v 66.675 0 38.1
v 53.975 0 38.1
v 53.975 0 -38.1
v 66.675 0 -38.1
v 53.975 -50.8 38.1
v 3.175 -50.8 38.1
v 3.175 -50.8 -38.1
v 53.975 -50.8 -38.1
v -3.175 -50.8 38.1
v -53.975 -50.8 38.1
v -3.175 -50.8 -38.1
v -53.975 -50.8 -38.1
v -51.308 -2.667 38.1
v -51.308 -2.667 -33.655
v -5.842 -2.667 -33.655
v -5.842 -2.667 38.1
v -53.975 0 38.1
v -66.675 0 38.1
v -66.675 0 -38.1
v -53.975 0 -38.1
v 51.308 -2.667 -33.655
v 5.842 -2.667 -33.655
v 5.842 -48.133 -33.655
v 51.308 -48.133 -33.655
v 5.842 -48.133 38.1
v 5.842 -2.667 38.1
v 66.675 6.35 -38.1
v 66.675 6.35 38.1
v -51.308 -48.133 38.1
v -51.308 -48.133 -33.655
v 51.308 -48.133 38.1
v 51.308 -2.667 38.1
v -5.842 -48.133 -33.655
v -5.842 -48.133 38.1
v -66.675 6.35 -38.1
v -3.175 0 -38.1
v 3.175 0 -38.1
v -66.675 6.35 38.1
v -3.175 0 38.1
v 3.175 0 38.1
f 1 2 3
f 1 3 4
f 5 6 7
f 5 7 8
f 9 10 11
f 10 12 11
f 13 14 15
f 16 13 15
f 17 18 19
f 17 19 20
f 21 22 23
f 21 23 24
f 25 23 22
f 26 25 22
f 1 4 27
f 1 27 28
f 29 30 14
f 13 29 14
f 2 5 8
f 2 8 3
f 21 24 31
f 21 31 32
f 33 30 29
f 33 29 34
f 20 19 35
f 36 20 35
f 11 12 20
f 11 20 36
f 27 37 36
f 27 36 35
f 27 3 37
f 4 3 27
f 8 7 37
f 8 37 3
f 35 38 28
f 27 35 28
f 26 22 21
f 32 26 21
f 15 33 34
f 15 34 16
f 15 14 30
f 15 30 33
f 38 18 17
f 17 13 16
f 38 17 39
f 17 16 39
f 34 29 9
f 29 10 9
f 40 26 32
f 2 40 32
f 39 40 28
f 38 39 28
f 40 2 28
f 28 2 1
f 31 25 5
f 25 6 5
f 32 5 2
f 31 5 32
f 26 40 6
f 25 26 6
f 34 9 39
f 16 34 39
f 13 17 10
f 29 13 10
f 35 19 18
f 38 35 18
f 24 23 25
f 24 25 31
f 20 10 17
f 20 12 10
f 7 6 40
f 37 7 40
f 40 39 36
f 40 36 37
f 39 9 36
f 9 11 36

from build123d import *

# Parameters (mm, degrees)
F0_W     = 133.35
F0_H     = 76.2
F2_DEPTH = 6.35
F1_W     = 50.8
F1_H     = 50.8
F1_W_2   = 45.466
F1_H_2   = 45.466
F3_DEPTH = 38.1
F4_START = -33.655
F4_DEPTH = 4.445


with BuildPart() as f2:
    # F0 (on Front) → F2 (new body)
    with BuildSketch(Plane.XZ):
        Rectangle(F0_W, F0_H)
    extrude(amount=-F2_DEPTH)

    # F1 (on Top) → F3 (join, symmetric)
    with BuildSketch(Plane.XY):
        with Locations((-28.575, -25.4)):
            Rectangle(F1_W, F1_H)
        with Locations((-28.575, -25.4)):
            Rectangle(F1_W_2, F1_H_2, mode=Mode.SUBTRACT)
        with Locations((28.575, -25.4)):
            Rectangle(F1_W, F1_H)
        with Locations((28.575, -25.4)):
            Rectangle(F1_W_2, F1_H_2, mode=Mode.SUBTRACT)
    extrude(amount=F3_DEPTH, both=True)

    # F1 (on Top) → F4 (join)
    with BuildSketch(Plane.XY.offset(F4_START)):
        with Locations((-28.575, -25.4)):
            Rectangle(F1_W_2, F1_H_2)
        with Locations((28.575, -25.4)):
            Rectangle(F1_W_2, F1_H_2)
    extrude(amount=-F4_DEPTH)


solid = f2.part
